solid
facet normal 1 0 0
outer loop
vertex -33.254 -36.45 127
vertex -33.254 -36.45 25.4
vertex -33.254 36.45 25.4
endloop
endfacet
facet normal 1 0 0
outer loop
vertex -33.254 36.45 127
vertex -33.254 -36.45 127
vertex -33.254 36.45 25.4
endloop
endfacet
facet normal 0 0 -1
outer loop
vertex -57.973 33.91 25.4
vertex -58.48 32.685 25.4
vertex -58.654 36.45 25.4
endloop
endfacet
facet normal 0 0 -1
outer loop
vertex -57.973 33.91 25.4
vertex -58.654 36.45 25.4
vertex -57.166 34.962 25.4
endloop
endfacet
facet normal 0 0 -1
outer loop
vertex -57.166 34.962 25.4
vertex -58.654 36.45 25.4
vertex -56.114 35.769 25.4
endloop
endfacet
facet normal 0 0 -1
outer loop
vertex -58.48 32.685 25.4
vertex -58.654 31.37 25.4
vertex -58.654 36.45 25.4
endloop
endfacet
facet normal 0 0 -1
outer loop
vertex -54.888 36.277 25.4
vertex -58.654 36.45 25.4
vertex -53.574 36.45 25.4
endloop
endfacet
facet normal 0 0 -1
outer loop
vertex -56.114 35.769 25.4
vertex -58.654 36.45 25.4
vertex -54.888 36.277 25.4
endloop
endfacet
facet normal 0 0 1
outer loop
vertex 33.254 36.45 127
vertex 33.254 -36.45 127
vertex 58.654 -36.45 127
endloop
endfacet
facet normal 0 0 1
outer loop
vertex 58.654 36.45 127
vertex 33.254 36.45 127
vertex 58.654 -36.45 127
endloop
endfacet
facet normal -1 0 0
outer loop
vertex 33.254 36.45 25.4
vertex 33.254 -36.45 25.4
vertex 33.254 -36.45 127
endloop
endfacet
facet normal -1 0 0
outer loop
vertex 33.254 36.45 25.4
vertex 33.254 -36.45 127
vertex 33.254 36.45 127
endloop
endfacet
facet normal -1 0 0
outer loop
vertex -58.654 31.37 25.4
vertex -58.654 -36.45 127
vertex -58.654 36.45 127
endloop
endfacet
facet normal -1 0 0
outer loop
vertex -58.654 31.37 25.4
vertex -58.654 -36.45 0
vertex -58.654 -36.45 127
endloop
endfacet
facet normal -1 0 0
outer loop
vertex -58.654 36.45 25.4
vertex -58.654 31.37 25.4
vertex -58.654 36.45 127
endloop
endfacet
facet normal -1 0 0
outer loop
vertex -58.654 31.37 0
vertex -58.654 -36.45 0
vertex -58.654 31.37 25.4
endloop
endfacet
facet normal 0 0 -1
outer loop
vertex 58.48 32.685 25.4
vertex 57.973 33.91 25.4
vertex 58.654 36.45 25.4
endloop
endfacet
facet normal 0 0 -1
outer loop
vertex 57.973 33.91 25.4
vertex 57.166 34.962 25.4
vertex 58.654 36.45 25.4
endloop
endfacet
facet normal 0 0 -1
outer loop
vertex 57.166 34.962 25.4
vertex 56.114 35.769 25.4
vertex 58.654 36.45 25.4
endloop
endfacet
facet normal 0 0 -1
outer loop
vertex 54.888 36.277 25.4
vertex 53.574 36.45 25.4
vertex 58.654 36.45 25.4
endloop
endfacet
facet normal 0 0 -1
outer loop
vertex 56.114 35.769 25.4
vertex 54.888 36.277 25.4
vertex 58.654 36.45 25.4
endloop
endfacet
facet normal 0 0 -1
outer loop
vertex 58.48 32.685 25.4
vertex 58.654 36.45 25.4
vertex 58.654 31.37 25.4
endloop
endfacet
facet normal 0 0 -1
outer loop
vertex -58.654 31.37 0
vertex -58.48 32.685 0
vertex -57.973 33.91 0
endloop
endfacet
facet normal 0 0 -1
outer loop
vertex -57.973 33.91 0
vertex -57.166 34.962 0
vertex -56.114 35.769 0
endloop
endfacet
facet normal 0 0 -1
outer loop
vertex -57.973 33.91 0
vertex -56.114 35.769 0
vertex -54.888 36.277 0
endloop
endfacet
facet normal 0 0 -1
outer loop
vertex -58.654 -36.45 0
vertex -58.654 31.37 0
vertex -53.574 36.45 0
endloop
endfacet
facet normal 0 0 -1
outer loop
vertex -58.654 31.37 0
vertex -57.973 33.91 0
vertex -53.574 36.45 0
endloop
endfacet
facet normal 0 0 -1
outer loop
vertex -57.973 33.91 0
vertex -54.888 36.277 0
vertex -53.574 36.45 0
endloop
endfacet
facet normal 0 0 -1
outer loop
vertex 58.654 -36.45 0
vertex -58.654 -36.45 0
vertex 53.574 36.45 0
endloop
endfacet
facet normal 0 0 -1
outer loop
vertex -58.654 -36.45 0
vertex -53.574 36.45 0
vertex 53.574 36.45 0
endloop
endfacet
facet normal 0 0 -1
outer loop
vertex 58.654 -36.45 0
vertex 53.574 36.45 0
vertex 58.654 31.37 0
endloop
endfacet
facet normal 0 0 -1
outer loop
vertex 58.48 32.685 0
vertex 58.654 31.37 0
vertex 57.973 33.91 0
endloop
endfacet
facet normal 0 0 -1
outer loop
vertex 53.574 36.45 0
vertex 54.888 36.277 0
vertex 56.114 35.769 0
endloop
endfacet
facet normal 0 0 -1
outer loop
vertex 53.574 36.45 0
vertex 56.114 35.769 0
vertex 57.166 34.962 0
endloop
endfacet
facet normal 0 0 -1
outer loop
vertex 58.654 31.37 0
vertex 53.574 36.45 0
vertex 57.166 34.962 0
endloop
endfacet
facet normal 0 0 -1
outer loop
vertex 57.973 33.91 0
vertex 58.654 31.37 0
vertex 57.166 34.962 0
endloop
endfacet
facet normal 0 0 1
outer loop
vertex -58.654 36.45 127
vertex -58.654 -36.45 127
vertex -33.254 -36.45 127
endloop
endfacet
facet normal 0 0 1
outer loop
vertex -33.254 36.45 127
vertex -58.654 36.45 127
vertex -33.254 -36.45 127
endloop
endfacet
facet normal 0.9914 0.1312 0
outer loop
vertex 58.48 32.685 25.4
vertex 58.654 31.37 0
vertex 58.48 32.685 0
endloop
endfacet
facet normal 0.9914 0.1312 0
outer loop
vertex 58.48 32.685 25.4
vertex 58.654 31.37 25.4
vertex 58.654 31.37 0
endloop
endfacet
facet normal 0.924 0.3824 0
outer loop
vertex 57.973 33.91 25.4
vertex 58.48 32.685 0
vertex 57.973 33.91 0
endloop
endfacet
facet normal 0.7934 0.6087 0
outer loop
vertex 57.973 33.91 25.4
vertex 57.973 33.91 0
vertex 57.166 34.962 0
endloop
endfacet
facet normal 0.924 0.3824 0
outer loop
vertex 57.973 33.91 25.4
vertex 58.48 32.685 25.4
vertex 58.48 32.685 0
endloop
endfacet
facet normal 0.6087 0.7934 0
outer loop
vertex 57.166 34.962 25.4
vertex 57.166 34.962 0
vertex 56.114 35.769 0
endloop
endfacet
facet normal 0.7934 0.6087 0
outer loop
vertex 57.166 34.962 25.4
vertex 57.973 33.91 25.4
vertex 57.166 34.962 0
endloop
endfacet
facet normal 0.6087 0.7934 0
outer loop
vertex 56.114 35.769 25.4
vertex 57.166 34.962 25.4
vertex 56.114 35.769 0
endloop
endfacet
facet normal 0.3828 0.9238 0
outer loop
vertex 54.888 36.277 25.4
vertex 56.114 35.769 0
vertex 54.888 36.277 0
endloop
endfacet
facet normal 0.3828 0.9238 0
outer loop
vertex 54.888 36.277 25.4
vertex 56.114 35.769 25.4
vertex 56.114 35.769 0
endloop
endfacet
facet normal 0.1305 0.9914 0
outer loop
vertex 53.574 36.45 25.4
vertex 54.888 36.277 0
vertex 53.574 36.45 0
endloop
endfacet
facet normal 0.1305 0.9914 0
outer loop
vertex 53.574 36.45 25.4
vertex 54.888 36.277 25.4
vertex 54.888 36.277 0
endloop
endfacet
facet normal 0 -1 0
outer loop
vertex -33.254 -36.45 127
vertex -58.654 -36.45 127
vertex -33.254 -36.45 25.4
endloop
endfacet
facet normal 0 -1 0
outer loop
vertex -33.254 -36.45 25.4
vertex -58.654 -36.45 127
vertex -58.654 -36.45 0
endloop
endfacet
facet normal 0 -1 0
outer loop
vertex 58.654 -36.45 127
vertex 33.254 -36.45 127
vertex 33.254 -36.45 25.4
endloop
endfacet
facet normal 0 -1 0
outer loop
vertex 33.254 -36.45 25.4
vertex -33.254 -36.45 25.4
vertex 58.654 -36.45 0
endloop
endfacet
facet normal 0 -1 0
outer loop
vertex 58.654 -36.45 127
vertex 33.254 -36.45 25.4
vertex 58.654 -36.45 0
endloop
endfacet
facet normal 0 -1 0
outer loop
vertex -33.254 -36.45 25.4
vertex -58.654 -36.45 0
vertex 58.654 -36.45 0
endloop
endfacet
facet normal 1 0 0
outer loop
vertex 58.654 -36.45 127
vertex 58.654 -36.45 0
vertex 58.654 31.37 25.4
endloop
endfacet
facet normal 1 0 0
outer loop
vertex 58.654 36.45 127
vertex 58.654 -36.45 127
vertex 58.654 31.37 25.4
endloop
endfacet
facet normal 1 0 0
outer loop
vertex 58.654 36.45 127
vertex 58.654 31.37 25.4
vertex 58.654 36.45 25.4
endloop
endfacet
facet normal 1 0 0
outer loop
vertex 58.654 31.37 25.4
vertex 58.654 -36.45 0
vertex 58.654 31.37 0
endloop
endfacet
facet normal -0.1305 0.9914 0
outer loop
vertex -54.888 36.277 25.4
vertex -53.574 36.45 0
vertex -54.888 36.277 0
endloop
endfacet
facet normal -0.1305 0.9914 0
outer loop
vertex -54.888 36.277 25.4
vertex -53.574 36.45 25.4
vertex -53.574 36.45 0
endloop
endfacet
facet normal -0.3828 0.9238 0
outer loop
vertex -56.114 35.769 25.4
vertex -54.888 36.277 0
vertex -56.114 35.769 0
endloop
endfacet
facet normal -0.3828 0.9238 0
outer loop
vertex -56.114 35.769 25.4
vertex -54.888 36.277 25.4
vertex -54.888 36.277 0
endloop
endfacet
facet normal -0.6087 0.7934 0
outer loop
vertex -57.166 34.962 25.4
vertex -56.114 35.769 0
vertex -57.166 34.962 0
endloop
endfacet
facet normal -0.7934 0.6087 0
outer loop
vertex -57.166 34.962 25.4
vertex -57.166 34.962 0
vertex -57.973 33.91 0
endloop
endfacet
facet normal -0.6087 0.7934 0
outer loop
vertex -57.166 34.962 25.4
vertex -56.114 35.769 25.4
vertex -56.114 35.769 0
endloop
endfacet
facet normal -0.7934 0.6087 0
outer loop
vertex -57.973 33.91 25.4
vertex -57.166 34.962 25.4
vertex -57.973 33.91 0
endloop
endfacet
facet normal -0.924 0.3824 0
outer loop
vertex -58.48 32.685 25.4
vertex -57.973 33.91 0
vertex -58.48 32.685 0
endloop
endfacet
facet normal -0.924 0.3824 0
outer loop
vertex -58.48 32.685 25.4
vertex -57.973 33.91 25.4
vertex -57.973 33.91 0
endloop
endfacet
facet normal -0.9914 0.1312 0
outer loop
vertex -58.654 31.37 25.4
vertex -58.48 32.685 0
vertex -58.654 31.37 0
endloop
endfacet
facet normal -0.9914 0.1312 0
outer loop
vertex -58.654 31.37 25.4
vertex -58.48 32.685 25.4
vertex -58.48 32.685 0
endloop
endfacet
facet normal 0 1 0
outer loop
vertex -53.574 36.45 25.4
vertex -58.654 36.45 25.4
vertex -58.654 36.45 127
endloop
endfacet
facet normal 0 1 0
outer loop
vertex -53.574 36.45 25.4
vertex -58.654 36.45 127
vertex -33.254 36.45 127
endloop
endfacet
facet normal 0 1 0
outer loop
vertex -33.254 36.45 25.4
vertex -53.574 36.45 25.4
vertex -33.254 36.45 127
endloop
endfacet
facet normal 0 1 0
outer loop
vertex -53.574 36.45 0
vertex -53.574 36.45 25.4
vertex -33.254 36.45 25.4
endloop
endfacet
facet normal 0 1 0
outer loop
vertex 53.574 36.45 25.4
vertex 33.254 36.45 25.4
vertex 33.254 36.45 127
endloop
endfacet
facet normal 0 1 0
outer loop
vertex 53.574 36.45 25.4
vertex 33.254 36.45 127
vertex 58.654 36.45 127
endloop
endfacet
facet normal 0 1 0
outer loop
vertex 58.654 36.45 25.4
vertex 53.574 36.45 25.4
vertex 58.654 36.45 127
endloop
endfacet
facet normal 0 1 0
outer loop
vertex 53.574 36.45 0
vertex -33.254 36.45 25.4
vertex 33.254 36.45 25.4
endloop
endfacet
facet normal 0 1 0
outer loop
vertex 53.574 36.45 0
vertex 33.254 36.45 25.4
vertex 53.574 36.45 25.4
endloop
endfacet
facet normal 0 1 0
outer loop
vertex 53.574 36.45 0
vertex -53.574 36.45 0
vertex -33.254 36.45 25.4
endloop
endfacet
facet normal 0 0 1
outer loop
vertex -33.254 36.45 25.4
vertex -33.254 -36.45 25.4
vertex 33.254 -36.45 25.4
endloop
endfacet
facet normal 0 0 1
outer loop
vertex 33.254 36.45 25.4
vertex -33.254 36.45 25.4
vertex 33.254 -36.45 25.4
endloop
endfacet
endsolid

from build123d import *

# Parameters (mm, degrees)
F0_W     = 117.30712
F0_H     = 72.89958
F1_DEPTH = 25.4
F2_R     = 5.08
F3_R     = 5.08
F4_W     = 25.4
F4_H     = 72.89958
F5_DEPTH = 101.6


with BuildPart() as f1:
    # F0 (on Top) → F1 (new body)
    with BuildSketch(Plane.XY):
        Rectangle(F0_W, F0_H)
    extrude(amount=F1_DEPTH)

    # F2
    f2_edges = [f1.edges().sort_by_distance(p)[0] for p in [
        (58.65356, 36.44979, 12.7),
    ]]
    fillet(f2_edges, radius=F2_R)

    # F3
    f3_edges = [f1.edges().sort_by_distance(p)[0] for p in [
        (-58.65356, 36.44979, 12.7),
    ]]
    fillet(f3_edges, radius=F3_R)

    # F4 (on face) → F5 (join)
    with BuildSketch(Plane.XY.offset(25.4)):
        with Locations((-45.95356, 0)):
            Rectangle(F4_W, F4_H)
        with Locations((45.95356, 0)):
            Rectangle(F4_W, F4_H)
    extrude(amount=F5_DEPTH)


solid = f1.part
